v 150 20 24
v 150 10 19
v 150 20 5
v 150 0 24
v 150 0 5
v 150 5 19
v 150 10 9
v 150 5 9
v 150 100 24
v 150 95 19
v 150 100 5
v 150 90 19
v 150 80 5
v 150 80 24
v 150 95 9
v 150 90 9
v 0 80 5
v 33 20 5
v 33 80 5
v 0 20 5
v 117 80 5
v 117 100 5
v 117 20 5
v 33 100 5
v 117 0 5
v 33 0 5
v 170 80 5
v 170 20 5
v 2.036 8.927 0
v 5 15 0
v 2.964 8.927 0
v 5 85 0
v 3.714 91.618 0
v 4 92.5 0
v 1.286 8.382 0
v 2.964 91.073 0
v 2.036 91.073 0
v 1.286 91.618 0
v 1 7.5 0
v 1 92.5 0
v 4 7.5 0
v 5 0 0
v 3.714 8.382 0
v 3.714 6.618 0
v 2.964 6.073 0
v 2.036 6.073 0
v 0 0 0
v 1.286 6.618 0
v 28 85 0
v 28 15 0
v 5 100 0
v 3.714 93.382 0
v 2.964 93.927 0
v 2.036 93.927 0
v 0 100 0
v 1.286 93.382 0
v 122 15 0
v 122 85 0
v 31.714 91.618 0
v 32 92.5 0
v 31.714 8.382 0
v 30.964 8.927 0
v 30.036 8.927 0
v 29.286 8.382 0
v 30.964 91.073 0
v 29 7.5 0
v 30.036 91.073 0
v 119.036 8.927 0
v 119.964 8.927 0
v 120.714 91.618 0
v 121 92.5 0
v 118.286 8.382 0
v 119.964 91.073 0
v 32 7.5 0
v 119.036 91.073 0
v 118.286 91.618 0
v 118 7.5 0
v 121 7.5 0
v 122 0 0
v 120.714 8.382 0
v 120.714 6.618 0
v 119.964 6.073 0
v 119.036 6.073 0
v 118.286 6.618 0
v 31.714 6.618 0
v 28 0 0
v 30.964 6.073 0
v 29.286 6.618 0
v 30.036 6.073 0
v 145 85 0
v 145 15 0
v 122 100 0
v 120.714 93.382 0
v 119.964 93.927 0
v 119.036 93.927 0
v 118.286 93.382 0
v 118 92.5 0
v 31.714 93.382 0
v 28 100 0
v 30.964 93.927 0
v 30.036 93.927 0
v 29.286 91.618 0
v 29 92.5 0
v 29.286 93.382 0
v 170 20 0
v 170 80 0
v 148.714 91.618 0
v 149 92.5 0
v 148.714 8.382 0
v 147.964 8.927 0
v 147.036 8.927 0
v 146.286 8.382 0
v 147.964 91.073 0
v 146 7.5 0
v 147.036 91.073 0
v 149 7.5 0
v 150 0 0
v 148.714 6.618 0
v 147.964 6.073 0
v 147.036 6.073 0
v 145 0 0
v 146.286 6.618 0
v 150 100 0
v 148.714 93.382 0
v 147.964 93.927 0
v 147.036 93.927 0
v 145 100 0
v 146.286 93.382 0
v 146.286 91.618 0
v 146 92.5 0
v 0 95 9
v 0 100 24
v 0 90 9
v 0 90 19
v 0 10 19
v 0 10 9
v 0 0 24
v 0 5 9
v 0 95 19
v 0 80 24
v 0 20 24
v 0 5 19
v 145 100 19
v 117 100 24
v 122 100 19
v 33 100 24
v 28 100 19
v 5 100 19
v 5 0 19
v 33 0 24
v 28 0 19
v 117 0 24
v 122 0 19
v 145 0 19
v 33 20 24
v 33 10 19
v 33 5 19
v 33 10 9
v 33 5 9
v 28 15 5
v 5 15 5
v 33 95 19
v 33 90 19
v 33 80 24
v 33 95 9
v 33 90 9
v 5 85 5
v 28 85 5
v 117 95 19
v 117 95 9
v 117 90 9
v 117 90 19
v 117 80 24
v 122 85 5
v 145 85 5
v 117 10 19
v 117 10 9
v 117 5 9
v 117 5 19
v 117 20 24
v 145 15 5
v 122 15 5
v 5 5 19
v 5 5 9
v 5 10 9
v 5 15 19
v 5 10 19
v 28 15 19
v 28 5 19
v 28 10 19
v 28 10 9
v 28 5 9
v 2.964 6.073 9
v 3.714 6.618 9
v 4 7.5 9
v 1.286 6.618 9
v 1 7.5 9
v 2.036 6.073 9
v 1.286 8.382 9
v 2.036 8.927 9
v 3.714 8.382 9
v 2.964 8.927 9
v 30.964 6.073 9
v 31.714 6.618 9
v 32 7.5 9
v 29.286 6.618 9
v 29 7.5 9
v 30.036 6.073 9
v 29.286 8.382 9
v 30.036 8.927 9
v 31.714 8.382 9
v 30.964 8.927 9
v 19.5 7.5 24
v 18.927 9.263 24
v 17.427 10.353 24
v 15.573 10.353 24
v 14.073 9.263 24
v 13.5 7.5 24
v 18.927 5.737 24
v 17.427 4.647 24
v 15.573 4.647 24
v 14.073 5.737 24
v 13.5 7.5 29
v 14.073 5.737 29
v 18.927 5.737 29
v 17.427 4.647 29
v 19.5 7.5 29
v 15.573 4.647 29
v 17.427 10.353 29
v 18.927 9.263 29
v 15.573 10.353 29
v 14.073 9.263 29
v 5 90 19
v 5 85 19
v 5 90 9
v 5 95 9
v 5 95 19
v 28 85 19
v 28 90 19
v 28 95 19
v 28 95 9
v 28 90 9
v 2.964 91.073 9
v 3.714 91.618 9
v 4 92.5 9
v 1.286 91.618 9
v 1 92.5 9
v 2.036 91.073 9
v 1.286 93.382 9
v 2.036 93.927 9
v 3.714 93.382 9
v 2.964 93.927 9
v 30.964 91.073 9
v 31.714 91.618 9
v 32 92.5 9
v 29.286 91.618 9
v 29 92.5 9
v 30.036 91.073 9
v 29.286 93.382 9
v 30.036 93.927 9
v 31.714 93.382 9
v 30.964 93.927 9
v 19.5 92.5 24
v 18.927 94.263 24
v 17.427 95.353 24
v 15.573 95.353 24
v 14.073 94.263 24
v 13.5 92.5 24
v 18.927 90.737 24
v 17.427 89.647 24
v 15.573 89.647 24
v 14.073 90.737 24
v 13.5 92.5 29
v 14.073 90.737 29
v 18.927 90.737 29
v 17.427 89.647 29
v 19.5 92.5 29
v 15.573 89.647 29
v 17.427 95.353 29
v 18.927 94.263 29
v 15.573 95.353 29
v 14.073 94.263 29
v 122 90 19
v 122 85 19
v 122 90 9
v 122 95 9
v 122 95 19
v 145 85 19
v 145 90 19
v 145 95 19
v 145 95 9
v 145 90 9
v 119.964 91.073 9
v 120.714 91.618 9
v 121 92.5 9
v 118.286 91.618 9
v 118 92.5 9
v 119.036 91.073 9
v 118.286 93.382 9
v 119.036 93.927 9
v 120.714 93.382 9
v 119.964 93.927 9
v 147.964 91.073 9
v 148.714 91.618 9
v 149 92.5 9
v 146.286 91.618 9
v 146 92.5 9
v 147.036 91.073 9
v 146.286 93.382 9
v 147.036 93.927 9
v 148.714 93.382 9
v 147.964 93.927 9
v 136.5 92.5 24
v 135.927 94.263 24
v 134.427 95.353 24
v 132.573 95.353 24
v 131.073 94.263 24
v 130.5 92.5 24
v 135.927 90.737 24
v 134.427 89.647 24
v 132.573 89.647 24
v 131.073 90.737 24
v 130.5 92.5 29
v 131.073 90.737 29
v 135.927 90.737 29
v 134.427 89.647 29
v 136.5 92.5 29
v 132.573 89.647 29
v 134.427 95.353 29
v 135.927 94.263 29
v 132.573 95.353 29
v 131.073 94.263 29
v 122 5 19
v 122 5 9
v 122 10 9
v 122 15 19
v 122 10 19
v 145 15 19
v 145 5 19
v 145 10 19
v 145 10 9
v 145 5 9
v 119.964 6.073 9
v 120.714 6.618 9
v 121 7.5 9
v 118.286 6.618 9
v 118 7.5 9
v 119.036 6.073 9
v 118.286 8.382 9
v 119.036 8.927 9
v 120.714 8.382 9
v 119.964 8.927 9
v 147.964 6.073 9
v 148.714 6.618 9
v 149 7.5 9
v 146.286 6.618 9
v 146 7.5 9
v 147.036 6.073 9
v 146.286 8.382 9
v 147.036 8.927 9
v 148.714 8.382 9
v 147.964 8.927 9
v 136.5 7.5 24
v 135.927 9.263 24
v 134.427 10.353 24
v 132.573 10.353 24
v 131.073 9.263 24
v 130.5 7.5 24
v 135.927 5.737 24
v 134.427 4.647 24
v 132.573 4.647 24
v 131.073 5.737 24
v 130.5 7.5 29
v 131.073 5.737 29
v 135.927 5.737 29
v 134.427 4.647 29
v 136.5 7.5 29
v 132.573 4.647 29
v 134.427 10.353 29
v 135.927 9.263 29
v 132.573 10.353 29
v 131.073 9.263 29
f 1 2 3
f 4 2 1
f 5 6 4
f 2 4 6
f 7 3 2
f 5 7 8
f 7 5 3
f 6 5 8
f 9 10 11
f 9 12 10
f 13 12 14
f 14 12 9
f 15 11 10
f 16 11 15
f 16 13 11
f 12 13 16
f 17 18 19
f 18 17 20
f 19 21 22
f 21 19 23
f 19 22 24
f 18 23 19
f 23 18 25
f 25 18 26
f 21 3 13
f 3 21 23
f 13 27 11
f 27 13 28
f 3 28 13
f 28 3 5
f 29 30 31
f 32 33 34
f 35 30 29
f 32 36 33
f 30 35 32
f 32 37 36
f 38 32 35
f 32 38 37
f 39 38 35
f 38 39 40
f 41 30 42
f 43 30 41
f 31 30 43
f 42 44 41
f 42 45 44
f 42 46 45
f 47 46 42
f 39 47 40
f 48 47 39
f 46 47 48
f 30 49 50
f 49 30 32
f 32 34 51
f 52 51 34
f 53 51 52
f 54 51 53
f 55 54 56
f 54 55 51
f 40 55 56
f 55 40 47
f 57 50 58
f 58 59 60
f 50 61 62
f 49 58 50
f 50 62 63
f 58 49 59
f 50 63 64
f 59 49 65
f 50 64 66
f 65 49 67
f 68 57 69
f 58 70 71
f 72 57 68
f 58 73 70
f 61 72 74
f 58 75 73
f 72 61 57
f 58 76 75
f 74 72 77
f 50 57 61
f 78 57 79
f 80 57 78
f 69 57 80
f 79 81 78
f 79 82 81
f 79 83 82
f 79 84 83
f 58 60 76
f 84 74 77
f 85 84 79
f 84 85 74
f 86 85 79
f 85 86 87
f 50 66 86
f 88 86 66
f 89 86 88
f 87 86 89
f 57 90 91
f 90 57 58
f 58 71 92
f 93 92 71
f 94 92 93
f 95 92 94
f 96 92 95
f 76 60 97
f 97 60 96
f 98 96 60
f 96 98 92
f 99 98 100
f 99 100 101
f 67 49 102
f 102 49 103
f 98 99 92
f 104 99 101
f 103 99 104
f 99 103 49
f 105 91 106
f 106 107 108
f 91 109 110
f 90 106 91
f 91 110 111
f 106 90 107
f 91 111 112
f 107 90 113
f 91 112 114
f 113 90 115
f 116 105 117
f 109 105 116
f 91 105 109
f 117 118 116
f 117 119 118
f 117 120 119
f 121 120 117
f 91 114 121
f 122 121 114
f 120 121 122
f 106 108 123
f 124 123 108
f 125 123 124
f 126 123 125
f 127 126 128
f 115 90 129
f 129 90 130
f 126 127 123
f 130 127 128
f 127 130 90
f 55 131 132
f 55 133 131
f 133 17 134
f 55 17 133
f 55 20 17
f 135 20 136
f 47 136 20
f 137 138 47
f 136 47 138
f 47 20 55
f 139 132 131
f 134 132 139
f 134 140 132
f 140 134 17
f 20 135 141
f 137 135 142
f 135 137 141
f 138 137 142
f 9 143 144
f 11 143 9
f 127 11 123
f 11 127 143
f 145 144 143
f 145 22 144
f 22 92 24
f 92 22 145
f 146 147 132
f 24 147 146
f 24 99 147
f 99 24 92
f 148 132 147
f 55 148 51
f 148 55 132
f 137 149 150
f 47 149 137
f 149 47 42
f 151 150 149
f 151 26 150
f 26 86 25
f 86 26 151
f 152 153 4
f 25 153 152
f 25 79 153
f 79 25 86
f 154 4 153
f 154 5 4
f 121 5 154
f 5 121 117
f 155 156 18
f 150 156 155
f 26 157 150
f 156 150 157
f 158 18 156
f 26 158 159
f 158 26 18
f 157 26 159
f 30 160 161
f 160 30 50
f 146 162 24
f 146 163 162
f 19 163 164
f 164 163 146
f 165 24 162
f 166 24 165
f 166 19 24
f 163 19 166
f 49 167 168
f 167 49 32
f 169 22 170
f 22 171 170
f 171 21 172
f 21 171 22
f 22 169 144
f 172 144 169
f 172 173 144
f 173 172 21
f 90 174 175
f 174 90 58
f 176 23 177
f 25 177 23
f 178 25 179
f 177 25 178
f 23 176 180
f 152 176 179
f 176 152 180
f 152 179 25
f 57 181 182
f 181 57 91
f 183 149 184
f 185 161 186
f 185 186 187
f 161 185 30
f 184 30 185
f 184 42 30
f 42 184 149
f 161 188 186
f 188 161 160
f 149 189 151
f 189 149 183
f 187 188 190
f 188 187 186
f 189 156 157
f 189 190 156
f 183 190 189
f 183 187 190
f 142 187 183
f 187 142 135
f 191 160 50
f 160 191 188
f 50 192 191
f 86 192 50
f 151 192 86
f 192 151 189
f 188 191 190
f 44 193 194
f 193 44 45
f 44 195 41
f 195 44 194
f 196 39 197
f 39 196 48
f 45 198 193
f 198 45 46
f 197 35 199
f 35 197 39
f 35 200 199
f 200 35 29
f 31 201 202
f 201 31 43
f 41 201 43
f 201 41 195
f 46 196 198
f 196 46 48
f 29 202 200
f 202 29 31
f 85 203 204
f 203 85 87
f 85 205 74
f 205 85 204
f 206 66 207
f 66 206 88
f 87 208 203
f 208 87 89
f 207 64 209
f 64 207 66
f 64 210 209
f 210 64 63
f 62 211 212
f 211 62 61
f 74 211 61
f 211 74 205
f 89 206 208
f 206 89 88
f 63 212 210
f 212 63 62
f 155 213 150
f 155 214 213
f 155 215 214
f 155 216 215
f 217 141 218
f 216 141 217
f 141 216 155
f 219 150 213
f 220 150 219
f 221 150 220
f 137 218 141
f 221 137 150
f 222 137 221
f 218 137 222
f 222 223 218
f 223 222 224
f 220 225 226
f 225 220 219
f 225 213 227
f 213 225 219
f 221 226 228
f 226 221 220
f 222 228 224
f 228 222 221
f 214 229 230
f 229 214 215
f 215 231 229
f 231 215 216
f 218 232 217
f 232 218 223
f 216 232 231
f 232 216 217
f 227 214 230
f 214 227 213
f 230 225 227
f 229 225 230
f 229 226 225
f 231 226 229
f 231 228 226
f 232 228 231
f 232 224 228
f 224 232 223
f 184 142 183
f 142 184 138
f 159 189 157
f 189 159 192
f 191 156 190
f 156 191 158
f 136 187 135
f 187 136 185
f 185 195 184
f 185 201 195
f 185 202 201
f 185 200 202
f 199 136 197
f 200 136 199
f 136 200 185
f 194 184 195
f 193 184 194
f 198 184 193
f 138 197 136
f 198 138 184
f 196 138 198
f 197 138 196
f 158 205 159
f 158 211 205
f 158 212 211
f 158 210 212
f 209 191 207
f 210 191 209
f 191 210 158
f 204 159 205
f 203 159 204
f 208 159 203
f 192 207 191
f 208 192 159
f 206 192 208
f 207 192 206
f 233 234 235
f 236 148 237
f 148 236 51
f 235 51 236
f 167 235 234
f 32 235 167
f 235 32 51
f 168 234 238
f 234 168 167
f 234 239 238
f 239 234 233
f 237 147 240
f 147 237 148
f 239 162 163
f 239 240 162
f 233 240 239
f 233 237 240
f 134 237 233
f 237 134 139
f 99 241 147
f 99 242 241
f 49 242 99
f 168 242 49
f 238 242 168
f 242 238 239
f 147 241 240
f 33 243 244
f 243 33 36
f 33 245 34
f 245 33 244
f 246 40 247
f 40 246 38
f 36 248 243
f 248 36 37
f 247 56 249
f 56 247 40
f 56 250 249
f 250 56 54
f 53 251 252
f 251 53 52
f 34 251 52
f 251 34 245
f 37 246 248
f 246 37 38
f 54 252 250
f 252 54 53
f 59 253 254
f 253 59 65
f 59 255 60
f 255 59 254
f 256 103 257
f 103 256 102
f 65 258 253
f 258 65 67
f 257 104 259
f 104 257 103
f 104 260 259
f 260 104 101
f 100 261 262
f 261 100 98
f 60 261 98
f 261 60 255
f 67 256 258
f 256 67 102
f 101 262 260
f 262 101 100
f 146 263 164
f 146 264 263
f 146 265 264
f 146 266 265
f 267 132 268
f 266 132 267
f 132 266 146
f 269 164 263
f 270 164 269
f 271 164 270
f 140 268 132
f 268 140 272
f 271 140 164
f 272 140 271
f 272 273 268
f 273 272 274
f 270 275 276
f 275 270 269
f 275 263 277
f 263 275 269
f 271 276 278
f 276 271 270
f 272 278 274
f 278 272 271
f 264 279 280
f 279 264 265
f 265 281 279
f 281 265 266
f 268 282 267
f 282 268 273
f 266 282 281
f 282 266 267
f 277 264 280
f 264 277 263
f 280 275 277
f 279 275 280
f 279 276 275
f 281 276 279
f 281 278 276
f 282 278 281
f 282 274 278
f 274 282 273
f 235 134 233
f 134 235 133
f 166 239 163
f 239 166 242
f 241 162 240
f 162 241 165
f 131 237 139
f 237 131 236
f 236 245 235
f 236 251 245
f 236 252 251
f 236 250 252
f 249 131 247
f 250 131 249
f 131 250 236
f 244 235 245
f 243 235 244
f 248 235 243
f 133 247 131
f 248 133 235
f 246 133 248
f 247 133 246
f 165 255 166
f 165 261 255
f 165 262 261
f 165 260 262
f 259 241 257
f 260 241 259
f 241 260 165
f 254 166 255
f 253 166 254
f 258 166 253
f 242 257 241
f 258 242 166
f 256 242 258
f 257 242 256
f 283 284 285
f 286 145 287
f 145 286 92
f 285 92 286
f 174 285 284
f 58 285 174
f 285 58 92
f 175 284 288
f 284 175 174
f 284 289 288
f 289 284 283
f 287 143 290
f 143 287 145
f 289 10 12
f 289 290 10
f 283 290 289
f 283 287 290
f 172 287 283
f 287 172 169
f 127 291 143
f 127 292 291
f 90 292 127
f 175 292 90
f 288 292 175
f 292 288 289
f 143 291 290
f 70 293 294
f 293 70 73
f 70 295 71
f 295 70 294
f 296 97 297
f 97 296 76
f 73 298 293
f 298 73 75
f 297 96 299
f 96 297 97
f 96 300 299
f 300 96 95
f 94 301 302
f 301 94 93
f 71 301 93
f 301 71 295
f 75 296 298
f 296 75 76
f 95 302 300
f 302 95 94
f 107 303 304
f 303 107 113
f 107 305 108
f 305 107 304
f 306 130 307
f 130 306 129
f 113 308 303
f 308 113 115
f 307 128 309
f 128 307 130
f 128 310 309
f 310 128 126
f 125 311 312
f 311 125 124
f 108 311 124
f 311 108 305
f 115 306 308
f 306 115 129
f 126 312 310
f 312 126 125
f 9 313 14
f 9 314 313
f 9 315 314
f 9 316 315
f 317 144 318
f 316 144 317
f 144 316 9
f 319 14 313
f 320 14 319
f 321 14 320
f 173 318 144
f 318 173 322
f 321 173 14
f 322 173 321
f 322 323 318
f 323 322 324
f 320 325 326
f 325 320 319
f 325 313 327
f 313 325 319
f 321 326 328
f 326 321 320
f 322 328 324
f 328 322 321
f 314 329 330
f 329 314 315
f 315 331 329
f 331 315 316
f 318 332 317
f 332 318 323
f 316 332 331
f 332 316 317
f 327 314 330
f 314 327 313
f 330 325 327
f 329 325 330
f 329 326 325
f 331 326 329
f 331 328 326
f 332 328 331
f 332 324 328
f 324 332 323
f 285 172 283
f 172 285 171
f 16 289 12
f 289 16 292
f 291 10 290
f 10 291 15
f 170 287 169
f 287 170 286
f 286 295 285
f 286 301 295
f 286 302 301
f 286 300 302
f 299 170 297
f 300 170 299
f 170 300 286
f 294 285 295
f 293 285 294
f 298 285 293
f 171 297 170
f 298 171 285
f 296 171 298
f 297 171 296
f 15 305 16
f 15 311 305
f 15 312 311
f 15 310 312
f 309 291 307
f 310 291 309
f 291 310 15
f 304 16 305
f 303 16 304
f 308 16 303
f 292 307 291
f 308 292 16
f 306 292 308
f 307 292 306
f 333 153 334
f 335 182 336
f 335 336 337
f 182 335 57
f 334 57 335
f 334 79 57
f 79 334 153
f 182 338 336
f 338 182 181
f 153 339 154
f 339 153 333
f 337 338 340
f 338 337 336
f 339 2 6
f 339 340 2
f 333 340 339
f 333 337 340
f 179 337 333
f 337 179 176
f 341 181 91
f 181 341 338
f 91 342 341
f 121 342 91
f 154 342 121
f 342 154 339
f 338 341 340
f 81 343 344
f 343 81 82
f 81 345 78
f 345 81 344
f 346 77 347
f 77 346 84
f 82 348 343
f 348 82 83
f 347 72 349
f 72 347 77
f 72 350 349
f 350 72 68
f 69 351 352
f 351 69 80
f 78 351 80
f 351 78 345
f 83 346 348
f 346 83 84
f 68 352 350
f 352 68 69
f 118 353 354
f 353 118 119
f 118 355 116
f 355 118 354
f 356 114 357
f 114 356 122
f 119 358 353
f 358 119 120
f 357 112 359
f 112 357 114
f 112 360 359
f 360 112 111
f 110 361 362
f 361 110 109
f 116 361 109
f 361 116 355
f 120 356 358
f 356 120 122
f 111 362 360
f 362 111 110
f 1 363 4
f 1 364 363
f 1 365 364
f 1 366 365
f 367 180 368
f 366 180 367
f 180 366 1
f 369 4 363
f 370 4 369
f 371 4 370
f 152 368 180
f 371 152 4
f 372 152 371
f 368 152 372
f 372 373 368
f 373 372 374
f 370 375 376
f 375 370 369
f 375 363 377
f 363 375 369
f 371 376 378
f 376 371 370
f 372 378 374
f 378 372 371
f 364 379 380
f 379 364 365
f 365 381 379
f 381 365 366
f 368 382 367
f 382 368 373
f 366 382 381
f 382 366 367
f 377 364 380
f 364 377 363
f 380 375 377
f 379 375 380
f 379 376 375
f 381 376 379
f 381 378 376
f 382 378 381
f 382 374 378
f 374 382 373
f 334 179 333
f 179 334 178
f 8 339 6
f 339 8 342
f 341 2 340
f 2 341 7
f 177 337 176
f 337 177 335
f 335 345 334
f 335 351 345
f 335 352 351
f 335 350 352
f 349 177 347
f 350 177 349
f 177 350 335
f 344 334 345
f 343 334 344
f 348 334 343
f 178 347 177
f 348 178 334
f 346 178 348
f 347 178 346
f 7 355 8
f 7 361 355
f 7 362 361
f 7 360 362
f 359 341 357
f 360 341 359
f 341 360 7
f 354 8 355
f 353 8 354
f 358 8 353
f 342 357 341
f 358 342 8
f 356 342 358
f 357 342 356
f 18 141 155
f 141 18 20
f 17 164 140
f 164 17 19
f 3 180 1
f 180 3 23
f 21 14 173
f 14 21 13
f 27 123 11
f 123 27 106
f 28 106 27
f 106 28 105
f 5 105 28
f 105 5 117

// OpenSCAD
$fn = 10;

//base height
bl = 150;
//base width
bw = 100;
//base front length
bfl = 20;
//global strength of material
s = 5;

//servo length
sl = 19;
//servo holder length
shl = 12;
//servo width
sw = 23;
//servo height
sh = 15;
//servo screw hole distance
ssd = 27;
//servo screw radius
ssr = 1.5;
//servo head length
shl = 11;
//bearing inner hole radius
bri = 3;
//bearing outer hole radius
bro = 10;
//bearing height
be_h = 5;

module servo_holder(shl=shl) {
    difference(){
        union(){
            cube([s,shl,sh]);
            translate([s+sw,0,0])cube([s,shl,sh]);
        }
        translate([s/2,shl,sh/2])rotate([90,0,0])cylinder(shl,ssr,ssr);
        translate([s+sw+s/2,shl,sh/2])rotate([90,0,0])cylinder(shl,ssr,ssr);
    }
    
}

module servo_holder_closed() {
    hole_length = 10;
    hole_width = 5;
    difference(){
        union(){
            servo_holder(sl);
            translate([0,sl,0]) cube([sw+2*s,s,sh]);
            translate([sw/2+s,sl+2*s,sh/2])rotate([90,0,0])cylinder(be_h,bri,bri);
        }
        translate([0,sl-hole_length,sh/2-hole_width/2])cube([sw+2*s,hole_length,hole_width]);
    }
}

//!servo_holder_closed();


difference(){
cube([bl,bw,s]);
//cut off holes for servos
cube([sw+2*s,sh,s]);
translate([0,bw-sh,0])cube([sw+2*s,sh,s]);
translate([bl-sw-2*s,bw-sh,0])cube([sw+2*s,sh,s]);
translate([bl-sw-2*s,0,0])cube([sw+2*s,sh,s]);
}

translate([bl,0,0])linear_extrude(s) polygon([[0,0],[0,bw],[bfl,bw-bfl],[bfl,bfl]]);

translate([0,sh,0]){
    //servo holder
    rotate([90,0,0])servo_holder_closed();
    translate([0,bw-sh,0])rotate([90,0,0])servo_holder_closed();
    translate([bl-sw-2*s,bw-sh,0])rotate([90,0,0])servo_holder_closed();
    translate([bl-sw-2*s,0,0])rotate([90,0,0])servo_holder_closed();
    //side covers for servo holders
    translate([0,0,s])cube([sw+2*s,s,sl]);    
    translate([0,bw-sh*2-s,s])cube([sw+2*s,s,sl]);
    translate([bl-sw-2*s,0,s])cube([sw+2*s,s,sl]);    
    translate([bl-sw-2*s,bw-sh*2-s,s])cube([sw+2*s,s,sl]);
}
